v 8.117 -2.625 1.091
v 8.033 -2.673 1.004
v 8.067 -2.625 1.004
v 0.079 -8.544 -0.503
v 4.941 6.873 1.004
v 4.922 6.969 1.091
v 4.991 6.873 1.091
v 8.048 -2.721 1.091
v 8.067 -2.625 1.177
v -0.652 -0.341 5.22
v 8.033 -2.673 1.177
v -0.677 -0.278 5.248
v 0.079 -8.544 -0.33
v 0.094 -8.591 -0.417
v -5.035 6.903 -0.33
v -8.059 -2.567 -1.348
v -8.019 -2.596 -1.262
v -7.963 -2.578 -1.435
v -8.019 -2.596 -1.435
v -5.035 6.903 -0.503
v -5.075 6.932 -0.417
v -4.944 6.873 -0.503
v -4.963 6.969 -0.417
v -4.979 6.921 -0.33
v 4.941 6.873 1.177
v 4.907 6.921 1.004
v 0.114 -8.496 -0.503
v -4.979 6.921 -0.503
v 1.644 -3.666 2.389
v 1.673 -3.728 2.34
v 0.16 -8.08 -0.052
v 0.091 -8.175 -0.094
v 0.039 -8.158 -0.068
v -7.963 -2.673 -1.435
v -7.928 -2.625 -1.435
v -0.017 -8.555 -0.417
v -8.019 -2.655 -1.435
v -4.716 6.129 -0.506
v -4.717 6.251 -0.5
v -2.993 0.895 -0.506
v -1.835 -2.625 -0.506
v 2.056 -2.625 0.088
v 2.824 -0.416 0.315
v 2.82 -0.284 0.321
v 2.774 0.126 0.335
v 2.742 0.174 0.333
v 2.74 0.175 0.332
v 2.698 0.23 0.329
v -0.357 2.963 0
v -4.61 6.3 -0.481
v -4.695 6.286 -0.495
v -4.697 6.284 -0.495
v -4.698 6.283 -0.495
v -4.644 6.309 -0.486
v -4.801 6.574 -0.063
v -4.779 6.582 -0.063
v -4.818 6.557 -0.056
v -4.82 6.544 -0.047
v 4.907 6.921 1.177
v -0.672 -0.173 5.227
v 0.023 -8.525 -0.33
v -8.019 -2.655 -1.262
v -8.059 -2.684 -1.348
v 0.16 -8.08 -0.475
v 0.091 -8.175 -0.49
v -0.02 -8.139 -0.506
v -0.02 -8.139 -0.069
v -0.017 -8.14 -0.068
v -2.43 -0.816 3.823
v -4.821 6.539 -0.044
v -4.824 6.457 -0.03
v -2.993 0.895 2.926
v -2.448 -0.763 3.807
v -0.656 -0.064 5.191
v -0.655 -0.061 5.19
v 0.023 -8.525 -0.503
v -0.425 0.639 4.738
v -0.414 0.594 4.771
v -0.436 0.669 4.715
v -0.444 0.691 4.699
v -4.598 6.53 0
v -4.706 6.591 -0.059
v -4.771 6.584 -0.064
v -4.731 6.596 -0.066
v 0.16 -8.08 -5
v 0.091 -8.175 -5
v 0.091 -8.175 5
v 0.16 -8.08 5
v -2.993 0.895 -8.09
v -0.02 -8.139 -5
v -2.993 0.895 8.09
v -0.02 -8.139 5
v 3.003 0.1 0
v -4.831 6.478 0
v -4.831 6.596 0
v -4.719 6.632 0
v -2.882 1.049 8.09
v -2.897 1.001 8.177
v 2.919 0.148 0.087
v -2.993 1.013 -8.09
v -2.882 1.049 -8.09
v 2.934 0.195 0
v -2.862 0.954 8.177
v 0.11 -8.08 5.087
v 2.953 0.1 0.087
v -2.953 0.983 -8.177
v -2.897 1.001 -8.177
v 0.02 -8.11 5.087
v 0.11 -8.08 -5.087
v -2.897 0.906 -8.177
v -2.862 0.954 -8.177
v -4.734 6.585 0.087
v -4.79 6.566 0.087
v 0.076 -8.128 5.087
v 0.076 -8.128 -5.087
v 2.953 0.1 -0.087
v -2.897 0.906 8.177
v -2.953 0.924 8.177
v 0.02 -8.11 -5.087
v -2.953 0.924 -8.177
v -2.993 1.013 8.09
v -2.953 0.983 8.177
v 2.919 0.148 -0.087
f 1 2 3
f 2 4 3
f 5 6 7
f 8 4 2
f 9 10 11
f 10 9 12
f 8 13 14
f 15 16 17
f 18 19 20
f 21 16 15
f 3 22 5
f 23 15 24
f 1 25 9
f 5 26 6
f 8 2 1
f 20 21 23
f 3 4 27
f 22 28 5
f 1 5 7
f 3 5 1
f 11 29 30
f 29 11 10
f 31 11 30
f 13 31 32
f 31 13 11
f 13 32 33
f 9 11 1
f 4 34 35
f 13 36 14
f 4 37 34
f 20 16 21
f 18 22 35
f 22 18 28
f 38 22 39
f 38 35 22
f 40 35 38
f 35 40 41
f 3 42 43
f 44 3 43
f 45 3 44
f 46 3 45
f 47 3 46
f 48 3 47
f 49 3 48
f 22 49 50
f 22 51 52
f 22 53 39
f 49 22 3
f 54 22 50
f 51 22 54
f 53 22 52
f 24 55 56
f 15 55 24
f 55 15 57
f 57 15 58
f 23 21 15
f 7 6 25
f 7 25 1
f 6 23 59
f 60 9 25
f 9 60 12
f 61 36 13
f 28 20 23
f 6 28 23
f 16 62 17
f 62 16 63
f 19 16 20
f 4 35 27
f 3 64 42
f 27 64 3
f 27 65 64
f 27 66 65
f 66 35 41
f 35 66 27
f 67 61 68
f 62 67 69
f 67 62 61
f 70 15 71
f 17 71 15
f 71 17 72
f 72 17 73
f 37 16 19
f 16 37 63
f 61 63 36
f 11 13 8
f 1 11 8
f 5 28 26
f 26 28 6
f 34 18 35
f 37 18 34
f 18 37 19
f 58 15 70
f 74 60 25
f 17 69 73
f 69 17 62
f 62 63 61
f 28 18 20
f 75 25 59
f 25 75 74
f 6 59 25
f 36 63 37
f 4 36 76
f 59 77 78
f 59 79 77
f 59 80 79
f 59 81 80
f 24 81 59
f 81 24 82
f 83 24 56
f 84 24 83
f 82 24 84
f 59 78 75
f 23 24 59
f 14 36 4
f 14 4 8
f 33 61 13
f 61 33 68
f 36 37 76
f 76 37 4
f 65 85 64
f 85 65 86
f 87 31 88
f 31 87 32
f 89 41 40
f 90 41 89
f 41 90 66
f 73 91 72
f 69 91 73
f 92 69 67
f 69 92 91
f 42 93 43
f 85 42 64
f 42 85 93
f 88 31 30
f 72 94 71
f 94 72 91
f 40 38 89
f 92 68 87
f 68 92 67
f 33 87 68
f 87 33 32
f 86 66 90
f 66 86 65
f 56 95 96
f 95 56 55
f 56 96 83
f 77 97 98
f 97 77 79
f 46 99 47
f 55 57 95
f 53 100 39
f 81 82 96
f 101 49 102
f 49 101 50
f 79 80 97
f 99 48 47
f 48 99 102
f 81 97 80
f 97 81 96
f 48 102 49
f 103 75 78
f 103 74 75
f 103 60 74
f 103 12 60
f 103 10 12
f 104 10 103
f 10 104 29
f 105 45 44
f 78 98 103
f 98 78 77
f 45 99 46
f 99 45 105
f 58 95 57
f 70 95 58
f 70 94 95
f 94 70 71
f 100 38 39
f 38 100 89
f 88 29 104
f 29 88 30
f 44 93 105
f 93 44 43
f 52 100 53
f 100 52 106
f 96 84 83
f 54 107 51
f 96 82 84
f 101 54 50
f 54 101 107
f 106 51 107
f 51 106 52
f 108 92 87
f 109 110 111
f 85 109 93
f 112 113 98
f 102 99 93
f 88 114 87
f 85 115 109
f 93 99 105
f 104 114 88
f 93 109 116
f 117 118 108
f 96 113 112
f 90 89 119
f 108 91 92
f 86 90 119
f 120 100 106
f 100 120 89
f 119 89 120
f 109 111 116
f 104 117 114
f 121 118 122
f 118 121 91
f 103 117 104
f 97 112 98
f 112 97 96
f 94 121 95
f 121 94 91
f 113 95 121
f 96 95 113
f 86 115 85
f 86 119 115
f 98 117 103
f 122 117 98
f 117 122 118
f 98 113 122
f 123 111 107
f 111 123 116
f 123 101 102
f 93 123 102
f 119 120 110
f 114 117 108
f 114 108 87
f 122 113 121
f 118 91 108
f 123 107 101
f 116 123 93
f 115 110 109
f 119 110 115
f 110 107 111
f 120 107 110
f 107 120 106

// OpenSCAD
// Auto-generated OpenSCAD file

    inner_points = 10*[[0.006041051977101475, -0.8080237563375162, 0.5000000000006635], [-0.29124754295317146, 0.09537426696641924, -0.8090169943752008], [-0.29124754295042443, 0.09537426696896514, 0.8090169943746941], [-0.47498199908503275, 0.6537049507402669, -8.199552148369094e-13], [0.006041051975403666, -0.8080237563390895, -0.49999999999933664], [0.2903071489285415, 0.010018287888955535, -1.106413997394639e-12]];

    outer_points = 10*[[-0.7978099914491895, -0.2625428334534335, -0.13482312819418532], [0.8017357049911781, -0.2625428334534335, 0.10907757649728182], [-0.49942562922089523, 0.687346061483792, -0.04166809798888336], [0.4891479777378736, 0.687346061483792, 0.10907082739049428], [0.006351937941033116, -0.8496064560607167, -0.04165717770470741], [-0.07915084916165496, -0.02604313074481797, 0.5190858316964722]];

    // Convex hull for inner set (I)
    module inner_hull() {
        hull() {
            for (p = inner_points) {
                translate(p) sphere(r=0.1);
            }
        }
    }

    // Convex hull for outer set (O) minus inner hull (O \ I)
    module outer_minus_inner() {
        difference() {
            hull() {
                for (p = outer_points) {
                    translate(p) sphere(r=0.1);
                }
            }
            inner_hull(); // Subtract inner hull
        }
    }

    // Convex hull for outer set (O) minus all translated inner hulls
    module outer_minus_AllTranslationInner() {
        difference() {
            hull() {
                for (p = outer_points) {
                    translate(p) sphere(r=0.1);
                }
            }
            hull() {
                translate([0,0,50]) inner_hull();
                translate([0,0,-50]) inner_hull();
            }; // Subtract translated inner hulls
        }
    }

    // Difference between outer_minus_inner and outer_minus_AllTranslationInner
    module outer_minus_inner_diff() {
        difference() {
            // Outer minus inner
            difference() {
                hull() {
                    for (p = outer_points) {
                        translate(p) sphere(r=0.1);
                    }
                }
                inner_hull();
            }

            // Subtract Outer minus AllTranslationInner
            difference() {
                hull() {
                    for (p = outer_points) {
                        translate(p) sphere(r=0.1);
                    }
                }
                hull() {
                    translate([0,0,50]) inner_hull();
                    translate([0,0,-50]) inner_hull();
                };
            }
        }
    }

    // Rendering all with colors applied
    color([1, 0, 0, 0.5]) inner_hull(); // Transparent red
    color([0, 1, 0, 1]) outer_minus_AllTranslationInner(); // Opaque green
    color([1, 1, 0, 1]) outer_minus_inner_diff(); // Opaque yellow
    
